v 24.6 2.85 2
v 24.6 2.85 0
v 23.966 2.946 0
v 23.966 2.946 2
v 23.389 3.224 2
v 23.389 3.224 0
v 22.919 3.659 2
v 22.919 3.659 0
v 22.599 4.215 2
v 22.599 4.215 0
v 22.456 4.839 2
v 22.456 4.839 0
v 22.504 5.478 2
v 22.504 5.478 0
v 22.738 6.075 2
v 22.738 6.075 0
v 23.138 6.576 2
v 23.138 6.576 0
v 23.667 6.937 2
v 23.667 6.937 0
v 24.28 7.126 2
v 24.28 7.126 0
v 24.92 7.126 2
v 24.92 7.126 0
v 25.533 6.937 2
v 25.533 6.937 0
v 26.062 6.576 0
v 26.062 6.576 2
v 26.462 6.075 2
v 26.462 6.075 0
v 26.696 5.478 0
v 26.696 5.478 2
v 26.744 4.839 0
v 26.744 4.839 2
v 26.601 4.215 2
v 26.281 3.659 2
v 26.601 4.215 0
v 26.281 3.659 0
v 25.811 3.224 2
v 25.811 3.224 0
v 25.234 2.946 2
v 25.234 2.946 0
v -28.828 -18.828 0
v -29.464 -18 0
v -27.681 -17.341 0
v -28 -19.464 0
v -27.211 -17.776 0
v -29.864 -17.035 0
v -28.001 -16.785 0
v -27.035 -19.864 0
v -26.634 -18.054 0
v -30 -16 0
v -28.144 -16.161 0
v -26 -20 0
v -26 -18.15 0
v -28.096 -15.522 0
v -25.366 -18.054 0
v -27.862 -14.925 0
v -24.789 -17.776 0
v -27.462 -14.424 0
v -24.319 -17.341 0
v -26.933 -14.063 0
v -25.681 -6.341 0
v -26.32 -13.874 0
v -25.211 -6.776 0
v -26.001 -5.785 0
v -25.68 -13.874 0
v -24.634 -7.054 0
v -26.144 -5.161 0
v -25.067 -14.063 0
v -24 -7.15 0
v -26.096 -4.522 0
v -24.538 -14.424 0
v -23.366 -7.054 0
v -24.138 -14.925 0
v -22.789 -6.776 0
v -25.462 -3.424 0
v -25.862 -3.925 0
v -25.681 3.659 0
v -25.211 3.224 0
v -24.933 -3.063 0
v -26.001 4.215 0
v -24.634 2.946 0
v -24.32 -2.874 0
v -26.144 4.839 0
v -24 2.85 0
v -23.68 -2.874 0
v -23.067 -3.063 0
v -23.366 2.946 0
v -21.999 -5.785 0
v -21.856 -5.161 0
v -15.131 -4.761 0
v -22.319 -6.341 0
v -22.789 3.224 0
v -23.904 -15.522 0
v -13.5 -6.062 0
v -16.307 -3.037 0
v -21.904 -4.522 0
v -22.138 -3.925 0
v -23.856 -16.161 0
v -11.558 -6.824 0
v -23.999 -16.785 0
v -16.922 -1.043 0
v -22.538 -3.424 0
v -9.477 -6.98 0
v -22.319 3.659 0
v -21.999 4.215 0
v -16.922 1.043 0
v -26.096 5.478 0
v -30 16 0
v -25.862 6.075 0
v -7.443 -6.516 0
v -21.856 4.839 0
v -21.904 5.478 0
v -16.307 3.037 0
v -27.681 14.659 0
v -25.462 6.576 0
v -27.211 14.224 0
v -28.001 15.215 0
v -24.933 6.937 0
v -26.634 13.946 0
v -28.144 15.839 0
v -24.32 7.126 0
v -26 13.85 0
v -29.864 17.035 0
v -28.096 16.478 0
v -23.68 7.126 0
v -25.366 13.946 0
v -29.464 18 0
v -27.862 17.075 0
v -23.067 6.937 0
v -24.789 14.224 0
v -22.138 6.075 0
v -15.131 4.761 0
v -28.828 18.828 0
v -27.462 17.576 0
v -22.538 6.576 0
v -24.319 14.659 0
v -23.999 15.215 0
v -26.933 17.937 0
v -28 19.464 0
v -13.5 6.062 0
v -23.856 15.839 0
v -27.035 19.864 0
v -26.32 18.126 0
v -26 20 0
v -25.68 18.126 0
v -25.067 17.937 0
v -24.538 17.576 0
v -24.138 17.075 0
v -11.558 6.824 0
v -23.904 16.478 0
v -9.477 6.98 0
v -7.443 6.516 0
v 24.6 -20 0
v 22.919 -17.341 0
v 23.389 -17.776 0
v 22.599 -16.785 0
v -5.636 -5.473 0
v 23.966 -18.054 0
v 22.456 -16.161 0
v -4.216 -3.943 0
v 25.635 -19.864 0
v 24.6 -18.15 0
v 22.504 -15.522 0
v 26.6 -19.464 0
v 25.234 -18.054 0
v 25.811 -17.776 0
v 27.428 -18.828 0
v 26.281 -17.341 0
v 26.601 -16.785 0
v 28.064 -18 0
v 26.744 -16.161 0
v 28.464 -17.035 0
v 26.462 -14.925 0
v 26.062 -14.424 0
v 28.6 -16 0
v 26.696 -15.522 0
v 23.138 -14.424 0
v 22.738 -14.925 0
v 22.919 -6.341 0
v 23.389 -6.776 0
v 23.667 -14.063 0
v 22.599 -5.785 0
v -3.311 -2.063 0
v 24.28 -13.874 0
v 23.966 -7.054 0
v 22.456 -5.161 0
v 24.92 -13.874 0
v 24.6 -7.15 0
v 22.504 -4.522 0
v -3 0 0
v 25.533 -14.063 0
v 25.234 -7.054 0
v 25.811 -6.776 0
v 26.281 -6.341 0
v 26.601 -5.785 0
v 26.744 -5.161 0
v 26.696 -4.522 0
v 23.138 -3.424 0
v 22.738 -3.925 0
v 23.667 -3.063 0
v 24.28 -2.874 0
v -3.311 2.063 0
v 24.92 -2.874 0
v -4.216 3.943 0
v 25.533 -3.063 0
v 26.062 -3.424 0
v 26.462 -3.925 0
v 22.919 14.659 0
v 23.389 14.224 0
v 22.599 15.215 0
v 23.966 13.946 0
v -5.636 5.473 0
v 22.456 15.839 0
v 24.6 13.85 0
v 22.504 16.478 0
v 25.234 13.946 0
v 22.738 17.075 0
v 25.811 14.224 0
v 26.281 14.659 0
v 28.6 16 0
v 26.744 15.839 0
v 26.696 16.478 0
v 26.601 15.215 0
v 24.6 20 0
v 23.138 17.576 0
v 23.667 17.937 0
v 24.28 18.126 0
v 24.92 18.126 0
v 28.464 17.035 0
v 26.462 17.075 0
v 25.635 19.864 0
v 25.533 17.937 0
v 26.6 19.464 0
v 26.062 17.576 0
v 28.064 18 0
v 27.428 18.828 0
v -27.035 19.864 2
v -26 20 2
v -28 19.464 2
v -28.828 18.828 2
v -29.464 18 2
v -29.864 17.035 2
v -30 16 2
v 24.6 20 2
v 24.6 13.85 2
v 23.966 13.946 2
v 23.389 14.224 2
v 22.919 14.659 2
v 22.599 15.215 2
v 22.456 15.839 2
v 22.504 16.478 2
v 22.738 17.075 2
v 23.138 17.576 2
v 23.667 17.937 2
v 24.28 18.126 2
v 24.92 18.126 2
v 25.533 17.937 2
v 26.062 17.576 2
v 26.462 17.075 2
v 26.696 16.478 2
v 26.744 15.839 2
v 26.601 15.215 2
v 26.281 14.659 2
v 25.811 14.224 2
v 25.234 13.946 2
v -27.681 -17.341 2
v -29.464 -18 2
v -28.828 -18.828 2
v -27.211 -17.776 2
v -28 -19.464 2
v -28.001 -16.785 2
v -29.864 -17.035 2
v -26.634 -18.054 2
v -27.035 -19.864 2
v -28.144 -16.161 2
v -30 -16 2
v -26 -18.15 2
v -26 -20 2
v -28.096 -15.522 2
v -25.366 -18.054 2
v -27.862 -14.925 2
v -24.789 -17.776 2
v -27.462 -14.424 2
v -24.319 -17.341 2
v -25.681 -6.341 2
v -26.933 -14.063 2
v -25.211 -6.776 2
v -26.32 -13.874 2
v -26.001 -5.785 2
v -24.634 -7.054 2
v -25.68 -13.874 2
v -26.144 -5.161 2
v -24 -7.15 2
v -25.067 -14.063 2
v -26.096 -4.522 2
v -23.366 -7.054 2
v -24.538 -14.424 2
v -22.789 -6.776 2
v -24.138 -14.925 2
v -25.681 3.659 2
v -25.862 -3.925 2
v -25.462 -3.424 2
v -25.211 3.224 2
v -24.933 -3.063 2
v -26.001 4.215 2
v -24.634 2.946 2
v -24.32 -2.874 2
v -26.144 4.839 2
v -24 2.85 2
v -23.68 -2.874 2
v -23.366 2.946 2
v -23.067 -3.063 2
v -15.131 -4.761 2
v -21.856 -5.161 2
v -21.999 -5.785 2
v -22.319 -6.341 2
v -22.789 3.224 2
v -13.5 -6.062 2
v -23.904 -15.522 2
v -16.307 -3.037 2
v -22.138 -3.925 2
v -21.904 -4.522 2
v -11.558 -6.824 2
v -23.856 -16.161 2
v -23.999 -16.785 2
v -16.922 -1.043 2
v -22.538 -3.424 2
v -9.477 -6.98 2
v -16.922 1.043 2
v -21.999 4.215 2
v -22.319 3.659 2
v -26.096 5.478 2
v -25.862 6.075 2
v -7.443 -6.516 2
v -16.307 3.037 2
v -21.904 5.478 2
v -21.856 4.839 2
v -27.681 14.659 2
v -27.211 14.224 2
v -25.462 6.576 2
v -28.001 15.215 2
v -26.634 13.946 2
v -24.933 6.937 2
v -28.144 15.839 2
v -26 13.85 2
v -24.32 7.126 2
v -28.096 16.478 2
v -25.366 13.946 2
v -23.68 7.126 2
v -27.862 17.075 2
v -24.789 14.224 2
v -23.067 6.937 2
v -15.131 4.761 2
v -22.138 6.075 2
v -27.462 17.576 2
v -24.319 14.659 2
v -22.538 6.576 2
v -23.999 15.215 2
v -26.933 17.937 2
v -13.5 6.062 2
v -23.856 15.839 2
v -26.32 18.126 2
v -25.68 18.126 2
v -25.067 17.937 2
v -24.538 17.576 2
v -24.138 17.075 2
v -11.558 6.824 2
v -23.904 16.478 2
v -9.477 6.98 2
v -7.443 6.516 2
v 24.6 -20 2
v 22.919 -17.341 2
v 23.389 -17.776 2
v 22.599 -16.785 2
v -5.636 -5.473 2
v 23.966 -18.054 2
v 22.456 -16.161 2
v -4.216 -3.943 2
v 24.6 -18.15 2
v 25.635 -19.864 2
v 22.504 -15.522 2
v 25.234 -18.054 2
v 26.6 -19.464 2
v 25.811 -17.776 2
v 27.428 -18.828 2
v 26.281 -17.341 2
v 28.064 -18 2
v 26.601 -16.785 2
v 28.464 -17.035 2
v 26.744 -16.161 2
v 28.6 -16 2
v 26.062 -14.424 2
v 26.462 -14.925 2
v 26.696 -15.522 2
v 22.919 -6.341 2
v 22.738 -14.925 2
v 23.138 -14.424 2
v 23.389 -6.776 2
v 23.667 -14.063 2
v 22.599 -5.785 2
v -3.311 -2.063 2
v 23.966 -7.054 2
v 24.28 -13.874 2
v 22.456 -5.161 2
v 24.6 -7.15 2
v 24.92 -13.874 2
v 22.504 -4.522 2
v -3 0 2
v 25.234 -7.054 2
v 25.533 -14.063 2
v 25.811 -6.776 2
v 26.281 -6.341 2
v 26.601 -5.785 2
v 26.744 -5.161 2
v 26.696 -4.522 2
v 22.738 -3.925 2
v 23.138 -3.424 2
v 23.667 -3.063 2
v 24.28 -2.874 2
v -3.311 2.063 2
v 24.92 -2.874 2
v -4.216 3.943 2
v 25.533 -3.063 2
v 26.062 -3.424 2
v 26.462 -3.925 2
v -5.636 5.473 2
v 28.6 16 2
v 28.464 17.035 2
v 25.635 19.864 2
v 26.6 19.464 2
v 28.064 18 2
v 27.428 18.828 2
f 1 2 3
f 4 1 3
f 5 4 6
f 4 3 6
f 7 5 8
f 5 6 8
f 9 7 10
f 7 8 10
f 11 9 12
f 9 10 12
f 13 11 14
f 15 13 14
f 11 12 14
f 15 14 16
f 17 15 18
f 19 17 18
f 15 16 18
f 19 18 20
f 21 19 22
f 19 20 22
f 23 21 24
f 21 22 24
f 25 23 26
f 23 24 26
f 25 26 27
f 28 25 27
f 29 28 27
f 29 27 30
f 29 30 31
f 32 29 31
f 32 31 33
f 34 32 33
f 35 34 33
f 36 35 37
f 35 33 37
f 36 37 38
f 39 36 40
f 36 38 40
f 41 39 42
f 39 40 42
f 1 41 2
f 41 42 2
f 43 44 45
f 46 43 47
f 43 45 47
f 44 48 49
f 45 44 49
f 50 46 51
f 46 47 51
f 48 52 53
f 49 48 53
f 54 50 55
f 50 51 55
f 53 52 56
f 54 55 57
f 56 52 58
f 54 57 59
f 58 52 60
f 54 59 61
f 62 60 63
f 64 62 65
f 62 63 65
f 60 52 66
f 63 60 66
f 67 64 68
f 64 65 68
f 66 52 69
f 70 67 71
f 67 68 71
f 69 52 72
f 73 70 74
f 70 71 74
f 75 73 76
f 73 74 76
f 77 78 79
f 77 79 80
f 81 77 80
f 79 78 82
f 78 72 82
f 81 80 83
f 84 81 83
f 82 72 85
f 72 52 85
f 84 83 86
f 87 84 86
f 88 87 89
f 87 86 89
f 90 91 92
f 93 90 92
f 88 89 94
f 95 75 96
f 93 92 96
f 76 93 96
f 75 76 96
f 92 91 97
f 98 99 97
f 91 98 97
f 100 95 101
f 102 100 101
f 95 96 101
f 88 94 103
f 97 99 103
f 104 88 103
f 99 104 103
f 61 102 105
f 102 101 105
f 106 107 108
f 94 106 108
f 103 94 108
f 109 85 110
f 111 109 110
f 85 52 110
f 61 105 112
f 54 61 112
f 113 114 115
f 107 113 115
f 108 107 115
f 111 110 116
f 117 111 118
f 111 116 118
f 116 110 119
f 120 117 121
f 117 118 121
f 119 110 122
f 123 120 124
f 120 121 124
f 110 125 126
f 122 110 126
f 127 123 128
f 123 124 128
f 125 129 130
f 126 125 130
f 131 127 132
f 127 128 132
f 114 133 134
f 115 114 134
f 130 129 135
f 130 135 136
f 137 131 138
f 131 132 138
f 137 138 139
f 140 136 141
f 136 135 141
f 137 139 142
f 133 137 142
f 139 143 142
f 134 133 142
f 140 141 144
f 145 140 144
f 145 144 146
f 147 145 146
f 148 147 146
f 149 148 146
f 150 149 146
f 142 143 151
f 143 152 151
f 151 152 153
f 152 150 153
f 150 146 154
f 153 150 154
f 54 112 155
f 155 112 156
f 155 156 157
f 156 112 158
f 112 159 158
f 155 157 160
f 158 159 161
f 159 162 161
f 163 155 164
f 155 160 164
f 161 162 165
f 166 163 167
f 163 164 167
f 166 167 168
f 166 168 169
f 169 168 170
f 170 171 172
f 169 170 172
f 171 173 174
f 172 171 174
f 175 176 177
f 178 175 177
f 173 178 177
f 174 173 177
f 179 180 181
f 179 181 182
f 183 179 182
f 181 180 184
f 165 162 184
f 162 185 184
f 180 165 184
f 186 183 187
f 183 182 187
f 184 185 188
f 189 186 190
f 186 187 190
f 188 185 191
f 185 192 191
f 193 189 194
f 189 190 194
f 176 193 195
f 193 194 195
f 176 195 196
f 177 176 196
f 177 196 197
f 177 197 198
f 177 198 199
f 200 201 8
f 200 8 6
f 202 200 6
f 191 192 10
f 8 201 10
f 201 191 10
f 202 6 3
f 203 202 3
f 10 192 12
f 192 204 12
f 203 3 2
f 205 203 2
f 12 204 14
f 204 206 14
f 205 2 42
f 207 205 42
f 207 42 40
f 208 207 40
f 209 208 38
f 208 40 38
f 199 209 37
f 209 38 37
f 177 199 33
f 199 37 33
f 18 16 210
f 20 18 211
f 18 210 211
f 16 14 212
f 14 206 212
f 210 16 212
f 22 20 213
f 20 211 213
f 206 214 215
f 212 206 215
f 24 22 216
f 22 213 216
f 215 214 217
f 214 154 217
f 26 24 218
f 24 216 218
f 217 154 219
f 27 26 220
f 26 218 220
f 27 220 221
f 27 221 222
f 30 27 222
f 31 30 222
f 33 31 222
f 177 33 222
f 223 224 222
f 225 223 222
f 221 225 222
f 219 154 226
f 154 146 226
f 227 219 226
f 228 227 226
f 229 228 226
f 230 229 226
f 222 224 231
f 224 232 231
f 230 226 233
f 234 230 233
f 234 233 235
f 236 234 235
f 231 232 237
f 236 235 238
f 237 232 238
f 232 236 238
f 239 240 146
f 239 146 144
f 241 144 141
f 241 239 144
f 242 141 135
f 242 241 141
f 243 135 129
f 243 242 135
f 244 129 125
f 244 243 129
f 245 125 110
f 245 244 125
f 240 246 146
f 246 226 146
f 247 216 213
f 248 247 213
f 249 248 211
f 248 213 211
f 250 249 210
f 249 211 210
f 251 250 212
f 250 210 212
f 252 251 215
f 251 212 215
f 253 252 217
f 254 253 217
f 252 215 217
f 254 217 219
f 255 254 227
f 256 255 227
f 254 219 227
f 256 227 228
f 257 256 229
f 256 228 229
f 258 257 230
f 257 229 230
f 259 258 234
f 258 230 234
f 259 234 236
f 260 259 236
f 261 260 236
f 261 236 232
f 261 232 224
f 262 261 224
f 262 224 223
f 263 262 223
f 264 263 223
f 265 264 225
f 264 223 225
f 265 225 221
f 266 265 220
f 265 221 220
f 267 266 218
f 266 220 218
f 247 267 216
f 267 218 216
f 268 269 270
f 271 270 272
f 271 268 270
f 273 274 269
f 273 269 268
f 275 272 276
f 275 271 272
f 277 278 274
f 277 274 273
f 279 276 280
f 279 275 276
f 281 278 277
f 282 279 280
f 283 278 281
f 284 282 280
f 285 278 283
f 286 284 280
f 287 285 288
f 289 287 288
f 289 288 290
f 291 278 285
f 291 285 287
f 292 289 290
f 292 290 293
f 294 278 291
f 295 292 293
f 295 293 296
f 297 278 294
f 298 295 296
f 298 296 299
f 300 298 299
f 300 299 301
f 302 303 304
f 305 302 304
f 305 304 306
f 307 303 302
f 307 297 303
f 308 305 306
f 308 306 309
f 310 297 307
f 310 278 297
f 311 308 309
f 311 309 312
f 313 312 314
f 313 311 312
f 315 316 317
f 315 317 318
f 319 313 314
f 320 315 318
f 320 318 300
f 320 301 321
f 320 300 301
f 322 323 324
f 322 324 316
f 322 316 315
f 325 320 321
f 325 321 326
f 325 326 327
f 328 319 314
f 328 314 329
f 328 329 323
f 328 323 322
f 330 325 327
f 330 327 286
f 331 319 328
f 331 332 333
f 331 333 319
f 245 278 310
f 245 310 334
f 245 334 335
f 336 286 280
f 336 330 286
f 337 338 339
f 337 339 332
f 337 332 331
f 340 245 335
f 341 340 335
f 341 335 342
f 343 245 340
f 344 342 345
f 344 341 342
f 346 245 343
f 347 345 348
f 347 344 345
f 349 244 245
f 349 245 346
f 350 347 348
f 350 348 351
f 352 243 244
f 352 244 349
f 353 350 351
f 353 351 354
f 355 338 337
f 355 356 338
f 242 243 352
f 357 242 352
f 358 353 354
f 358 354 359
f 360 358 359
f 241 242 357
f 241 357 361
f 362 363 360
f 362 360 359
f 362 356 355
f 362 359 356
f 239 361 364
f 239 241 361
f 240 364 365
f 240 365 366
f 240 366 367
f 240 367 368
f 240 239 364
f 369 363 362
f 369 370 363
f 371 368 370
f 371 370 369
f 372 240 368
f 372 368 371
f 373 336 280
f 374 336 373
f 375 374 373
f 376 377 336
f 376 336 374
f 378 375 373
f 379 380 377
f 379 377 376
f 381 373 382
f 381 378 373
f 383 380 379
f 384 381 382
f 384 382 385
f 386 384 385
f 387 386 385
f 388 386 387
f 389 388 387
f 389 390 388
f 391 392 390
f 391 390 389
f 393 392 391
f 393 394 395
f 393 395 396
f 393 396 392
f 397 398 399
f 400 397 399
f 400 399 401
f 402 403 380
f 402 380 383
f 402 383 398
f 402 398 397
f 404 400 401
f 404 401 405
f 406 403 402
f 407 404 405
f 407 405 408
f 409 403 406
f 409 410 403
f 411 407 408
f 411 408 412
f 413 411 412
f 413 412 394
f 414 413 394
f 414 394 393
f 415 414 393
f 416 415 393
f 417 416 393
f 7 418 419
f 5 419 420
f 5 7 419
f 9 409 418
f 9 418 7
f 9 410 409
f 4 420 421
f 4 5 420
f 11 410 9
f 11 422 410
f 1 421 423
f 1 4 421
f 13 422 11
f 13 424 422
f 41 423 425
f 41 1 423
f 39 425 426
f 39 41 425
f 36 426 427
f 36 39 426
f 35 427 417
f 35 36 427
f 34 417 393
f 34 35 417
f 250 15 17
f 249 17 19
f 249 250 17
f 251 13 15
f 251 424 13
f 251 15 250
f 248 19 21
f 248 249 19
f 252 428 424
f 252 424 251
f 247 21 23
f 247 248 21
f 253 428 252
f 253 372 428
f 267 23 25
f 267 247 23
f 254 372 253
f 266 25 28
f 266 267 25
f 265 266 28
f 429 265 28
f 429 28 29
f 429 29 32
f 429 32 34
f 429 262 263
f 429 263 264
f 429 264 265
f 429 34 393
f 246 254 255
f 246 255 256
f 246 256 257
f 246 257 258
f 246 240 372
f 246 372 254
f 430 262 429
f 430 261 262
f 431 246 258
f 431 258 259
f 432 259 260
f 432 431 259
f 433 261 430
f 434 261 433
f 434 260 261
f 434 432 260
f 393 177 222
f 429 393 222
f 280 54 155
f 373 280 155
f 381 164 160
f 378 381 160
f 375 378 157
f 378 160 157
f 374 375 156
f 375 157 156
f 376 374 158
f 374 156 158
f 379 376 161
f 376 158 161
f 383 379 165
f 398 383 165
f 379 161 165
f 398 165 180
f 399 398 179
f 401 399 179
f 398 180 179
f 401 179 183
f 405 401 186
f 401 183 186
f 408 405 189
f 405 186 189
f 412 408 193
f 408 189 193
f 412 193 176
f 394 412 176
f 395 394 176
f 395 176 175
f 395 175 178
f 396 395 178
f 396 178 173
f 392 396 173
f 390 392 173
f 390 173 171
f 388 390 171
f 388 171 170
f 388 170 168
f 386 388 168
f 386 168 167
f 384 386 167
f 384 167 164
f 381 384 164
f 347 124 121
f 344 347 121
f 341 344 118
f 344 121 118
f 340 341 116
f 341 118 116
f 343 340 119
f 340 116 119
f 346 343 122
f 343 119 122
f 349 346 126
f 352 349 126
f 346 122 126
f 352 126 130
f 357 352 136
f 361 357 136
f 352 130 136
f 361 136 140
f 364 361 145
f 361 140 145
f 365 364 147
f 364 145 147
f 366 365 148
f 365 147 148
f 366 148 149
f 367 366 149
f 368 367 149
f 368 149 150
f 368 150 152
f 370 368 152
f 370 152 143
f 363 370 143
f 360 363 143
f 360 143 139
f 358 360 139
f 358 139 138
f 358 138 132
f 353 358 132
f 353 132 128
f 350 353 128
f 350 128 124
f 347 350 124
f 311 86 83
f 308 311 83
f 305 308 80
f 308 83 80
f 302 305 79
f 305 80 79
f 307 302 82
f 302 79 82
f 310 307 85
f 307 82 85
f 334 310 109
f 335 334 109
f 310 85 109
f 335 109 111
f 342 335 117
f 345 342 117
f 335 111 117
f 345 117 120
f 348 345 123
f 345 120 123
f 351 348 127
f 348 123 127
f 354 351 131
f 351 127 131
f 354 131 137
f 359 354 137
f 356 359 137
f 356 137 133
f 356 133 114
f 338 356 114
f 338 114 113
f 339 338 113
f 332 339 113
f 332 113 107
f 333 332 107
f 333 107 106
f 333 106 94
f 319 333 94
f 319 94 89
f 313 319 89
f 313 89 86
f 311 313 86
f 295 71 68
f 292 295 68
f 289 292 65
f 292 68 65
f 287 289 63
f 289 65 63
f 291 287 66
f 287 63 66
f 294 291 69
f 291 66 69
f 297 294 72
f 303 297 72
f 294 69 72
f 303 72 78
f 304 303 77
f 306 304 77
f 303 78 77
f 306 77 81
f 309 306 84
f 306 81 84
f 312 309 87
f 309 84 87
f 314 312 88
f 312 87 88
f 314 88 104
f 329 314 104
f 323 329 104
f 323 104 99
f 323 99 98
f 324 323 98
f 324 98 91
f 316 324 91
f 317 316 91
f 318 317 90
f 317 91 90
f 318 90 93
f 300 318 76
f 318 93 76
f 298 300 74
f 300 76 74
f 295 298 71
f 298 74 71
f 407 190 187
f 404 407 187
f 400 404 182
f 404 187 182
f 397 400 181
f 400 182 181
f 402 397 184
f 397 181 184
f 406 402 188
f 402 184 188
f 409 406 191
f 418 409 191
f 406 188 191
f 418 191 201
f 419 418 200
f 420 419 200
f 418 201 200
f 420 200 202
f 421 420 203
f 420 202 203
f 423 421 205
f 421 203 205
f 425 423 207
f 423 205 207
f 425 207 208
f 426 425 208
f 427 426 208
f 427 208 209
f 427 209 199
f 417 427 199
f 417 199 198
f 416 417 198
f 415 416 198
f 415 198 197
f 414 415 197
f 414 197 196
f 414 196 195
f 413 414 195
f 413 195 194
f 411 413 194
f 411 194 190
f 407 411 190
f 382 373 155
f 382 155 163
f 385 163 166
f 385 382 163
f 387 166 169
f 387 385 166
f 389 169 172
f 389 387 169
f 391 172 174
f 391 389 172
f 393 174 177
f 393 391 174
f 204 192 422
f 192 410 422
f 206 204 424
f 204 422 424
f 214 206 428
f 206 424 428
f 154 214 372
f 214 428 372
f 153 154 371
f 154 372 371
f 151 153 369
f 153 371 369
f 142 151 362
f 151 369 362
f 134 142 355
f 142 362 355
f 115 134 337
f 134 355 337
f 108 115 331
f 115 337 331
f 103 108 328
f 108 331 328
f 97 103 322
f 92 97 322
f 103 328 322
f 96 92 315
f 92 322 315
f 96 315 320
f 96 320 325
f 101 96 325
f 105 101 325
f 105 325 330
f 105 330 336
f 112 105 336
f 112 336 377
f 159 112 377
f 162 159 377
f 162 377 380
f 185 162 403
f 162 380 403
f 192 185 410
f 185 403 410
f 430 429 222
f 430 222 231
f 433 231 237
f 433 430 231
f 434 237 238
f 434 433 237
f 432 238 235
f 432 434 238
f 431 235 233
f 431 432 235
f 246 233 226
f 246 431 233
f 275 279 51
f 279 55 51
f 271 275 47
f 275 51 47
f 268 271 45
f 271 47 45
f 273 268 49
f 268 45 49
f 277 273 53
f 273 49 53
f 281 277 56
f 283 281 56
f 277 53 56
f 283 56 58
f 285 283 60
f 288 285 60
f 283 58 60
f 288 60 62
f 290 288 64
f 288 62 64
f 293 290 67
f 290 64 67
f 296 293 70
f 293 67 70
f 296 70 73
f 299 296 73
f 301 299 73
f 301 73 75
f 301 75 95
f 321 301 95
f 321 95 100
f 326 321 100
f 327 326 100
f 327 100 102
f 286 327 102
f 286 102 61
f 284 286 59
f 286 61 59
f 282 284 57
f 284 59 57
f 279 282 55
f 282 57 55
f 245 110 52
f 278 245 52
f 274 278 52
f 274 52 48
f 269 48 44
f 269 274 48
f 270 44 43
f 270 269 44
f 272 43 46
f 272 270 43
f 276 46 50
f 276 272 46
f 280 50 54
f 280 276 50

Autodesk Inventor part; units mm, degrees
ref_plane "YZ Plane" through (0, 0, 0) normal (1, 0, 0) x (0, 1, 0)
ref_plane "XZ Plane" through (0, 0, 0) normal (0, 1, 0) x (-1, 0, 0)
ref_plane "XY Plane" through (0, 0, 0) normal (0, 0, 1) x (1, 0, 0)
sketch "スケッチ1" plane through (0, 0, 0) normal (0, 0, 1) x (1, 0, 0)
  line L0 (-30, -20) -> (28.6, -20)
  line L1 (28.6, -20) -> (28.6, 20)
  line L2 (28.6, 20) -> (-30, 20)
  line L3 (-30, 20) -> (-30, -20)
  point P0 (0, 0)
  dimension "d1" = 40
  dimension "d28" = 30
  dimension "d29" = 28.6
  dimension "d32" = 20
extrude "プレート1" add sketch "スケッチ1" along normal blind 2
sketch "スケッチ2" plane through (0, 0, 2) normal (0, 0, 1) x (1, 0, 0)
  line L0 (-24, -5) -> (24.6, -5)
  line L1 (24.6, -5) -> (24.6, 5)
  line L2 (24.6, 5) -> (-24, 5)
  line L3 (-24, 5) -> (-24, -5)
  line L4 (-24, -5) -> (24.6, 5) construction
  line L5 (24.6, -5) -> (-24, 5) construction
  line L6 (28.6, -20) -> (-30, -20) projected
  line L7 (-30, -20) -> (-30, 20) projected
  line L8 (28.6, -20) -> (-30, -20) projected
  line L9 (28.6, 20) -> (28.6, -20) projected
  line L10 (-30, 20) -> (28.6, 20) projected
  circle A0 centre (-10, 0) radius 7
  point P0 (0.3, 0)
  point P1 (0.3, 0)
  point P2 (0.3, 0)
  point P3 (0, 0)
  dimension "d3" = 48.6
  dimension "d5" = 10
  dimension "d8" = 20
  dimension "d16" = 14
  dimension "d30" = 20
  dimension "d31" = 14
hole "穴1" at (24.6, 5, 2) at (24.6, -5, 2) at (-24, 5, 2) at (-24, -5, 2) direction (0, 0, -1) diameter 4.3 end through all clearance for "Socket Head Cap Screw" size "M4" standard "Ansi Metric M Profile"
extrude "押し出し1" cut sketch "スケッチ2" against normal blind 10 contours A0 L2 L0 | L0 A0 | A0 L2
sketch "スケッチ3" plane through (0, 0, 2) normal (0, 0, 1) x (1, 0, 0)
  line L0 (-30, 20) -> (28.6, 20) projected
  line L1 (-30, -20) -> (-30, 20) projected
  line L2 (28.6, -20) -> (-30, -20) projected
  line L3 (28.6, 20) -> (28.6, -20) projected
  line L4 (24.6, 16) -> (-26, 16)
  line L5 (-26, 16) -> (-26, -16)
  line L6 (-26, -16) -> (24.6, -16)
  line L7 (24.6, -16) -> (24.6, 16)
  point P0 (0, 0)
  dimension "d19" = 4
hole "穴2" at (-26, 16, 2) at (-26, -16, 2) at (24.6, 16, 2) at (24.6, -16, 2) direction (0, 0, -1) diameter 4.3 end through all clearance for "Socket Head Cap Screw" size "M4" standard "Ansi Metric M Profile"
fillet "コーナーR1" radius 4 4 edges at (28.6, 20, 1) (-30, 20, 1) (-30, -20, 1) (28.6, -20, 1)
equation "\"d14\" = Thickness"
equation "\"d2\" = Thickness"
equation "\"BendRadius\" = Thickness"
equation "\"BendReliefWidth\" = Thickness"
equation "\"BendReliefDepth\" = 0.5 * Thickness"
equation "\"CornerReliefSize\" = 4 * Thickness"
equation "\"MinimumRemnant\" = 2 * Thickness"
equation "\"TransitionRadius\" = BendRadius"
equation "\"JacobiRadiusSize\" = BendRadius"
equation "\"GapSize\" = Thickness"
equation "\"Thickness\" = 2"
properties part number "s_carbon_plate4" material "CFRP"
